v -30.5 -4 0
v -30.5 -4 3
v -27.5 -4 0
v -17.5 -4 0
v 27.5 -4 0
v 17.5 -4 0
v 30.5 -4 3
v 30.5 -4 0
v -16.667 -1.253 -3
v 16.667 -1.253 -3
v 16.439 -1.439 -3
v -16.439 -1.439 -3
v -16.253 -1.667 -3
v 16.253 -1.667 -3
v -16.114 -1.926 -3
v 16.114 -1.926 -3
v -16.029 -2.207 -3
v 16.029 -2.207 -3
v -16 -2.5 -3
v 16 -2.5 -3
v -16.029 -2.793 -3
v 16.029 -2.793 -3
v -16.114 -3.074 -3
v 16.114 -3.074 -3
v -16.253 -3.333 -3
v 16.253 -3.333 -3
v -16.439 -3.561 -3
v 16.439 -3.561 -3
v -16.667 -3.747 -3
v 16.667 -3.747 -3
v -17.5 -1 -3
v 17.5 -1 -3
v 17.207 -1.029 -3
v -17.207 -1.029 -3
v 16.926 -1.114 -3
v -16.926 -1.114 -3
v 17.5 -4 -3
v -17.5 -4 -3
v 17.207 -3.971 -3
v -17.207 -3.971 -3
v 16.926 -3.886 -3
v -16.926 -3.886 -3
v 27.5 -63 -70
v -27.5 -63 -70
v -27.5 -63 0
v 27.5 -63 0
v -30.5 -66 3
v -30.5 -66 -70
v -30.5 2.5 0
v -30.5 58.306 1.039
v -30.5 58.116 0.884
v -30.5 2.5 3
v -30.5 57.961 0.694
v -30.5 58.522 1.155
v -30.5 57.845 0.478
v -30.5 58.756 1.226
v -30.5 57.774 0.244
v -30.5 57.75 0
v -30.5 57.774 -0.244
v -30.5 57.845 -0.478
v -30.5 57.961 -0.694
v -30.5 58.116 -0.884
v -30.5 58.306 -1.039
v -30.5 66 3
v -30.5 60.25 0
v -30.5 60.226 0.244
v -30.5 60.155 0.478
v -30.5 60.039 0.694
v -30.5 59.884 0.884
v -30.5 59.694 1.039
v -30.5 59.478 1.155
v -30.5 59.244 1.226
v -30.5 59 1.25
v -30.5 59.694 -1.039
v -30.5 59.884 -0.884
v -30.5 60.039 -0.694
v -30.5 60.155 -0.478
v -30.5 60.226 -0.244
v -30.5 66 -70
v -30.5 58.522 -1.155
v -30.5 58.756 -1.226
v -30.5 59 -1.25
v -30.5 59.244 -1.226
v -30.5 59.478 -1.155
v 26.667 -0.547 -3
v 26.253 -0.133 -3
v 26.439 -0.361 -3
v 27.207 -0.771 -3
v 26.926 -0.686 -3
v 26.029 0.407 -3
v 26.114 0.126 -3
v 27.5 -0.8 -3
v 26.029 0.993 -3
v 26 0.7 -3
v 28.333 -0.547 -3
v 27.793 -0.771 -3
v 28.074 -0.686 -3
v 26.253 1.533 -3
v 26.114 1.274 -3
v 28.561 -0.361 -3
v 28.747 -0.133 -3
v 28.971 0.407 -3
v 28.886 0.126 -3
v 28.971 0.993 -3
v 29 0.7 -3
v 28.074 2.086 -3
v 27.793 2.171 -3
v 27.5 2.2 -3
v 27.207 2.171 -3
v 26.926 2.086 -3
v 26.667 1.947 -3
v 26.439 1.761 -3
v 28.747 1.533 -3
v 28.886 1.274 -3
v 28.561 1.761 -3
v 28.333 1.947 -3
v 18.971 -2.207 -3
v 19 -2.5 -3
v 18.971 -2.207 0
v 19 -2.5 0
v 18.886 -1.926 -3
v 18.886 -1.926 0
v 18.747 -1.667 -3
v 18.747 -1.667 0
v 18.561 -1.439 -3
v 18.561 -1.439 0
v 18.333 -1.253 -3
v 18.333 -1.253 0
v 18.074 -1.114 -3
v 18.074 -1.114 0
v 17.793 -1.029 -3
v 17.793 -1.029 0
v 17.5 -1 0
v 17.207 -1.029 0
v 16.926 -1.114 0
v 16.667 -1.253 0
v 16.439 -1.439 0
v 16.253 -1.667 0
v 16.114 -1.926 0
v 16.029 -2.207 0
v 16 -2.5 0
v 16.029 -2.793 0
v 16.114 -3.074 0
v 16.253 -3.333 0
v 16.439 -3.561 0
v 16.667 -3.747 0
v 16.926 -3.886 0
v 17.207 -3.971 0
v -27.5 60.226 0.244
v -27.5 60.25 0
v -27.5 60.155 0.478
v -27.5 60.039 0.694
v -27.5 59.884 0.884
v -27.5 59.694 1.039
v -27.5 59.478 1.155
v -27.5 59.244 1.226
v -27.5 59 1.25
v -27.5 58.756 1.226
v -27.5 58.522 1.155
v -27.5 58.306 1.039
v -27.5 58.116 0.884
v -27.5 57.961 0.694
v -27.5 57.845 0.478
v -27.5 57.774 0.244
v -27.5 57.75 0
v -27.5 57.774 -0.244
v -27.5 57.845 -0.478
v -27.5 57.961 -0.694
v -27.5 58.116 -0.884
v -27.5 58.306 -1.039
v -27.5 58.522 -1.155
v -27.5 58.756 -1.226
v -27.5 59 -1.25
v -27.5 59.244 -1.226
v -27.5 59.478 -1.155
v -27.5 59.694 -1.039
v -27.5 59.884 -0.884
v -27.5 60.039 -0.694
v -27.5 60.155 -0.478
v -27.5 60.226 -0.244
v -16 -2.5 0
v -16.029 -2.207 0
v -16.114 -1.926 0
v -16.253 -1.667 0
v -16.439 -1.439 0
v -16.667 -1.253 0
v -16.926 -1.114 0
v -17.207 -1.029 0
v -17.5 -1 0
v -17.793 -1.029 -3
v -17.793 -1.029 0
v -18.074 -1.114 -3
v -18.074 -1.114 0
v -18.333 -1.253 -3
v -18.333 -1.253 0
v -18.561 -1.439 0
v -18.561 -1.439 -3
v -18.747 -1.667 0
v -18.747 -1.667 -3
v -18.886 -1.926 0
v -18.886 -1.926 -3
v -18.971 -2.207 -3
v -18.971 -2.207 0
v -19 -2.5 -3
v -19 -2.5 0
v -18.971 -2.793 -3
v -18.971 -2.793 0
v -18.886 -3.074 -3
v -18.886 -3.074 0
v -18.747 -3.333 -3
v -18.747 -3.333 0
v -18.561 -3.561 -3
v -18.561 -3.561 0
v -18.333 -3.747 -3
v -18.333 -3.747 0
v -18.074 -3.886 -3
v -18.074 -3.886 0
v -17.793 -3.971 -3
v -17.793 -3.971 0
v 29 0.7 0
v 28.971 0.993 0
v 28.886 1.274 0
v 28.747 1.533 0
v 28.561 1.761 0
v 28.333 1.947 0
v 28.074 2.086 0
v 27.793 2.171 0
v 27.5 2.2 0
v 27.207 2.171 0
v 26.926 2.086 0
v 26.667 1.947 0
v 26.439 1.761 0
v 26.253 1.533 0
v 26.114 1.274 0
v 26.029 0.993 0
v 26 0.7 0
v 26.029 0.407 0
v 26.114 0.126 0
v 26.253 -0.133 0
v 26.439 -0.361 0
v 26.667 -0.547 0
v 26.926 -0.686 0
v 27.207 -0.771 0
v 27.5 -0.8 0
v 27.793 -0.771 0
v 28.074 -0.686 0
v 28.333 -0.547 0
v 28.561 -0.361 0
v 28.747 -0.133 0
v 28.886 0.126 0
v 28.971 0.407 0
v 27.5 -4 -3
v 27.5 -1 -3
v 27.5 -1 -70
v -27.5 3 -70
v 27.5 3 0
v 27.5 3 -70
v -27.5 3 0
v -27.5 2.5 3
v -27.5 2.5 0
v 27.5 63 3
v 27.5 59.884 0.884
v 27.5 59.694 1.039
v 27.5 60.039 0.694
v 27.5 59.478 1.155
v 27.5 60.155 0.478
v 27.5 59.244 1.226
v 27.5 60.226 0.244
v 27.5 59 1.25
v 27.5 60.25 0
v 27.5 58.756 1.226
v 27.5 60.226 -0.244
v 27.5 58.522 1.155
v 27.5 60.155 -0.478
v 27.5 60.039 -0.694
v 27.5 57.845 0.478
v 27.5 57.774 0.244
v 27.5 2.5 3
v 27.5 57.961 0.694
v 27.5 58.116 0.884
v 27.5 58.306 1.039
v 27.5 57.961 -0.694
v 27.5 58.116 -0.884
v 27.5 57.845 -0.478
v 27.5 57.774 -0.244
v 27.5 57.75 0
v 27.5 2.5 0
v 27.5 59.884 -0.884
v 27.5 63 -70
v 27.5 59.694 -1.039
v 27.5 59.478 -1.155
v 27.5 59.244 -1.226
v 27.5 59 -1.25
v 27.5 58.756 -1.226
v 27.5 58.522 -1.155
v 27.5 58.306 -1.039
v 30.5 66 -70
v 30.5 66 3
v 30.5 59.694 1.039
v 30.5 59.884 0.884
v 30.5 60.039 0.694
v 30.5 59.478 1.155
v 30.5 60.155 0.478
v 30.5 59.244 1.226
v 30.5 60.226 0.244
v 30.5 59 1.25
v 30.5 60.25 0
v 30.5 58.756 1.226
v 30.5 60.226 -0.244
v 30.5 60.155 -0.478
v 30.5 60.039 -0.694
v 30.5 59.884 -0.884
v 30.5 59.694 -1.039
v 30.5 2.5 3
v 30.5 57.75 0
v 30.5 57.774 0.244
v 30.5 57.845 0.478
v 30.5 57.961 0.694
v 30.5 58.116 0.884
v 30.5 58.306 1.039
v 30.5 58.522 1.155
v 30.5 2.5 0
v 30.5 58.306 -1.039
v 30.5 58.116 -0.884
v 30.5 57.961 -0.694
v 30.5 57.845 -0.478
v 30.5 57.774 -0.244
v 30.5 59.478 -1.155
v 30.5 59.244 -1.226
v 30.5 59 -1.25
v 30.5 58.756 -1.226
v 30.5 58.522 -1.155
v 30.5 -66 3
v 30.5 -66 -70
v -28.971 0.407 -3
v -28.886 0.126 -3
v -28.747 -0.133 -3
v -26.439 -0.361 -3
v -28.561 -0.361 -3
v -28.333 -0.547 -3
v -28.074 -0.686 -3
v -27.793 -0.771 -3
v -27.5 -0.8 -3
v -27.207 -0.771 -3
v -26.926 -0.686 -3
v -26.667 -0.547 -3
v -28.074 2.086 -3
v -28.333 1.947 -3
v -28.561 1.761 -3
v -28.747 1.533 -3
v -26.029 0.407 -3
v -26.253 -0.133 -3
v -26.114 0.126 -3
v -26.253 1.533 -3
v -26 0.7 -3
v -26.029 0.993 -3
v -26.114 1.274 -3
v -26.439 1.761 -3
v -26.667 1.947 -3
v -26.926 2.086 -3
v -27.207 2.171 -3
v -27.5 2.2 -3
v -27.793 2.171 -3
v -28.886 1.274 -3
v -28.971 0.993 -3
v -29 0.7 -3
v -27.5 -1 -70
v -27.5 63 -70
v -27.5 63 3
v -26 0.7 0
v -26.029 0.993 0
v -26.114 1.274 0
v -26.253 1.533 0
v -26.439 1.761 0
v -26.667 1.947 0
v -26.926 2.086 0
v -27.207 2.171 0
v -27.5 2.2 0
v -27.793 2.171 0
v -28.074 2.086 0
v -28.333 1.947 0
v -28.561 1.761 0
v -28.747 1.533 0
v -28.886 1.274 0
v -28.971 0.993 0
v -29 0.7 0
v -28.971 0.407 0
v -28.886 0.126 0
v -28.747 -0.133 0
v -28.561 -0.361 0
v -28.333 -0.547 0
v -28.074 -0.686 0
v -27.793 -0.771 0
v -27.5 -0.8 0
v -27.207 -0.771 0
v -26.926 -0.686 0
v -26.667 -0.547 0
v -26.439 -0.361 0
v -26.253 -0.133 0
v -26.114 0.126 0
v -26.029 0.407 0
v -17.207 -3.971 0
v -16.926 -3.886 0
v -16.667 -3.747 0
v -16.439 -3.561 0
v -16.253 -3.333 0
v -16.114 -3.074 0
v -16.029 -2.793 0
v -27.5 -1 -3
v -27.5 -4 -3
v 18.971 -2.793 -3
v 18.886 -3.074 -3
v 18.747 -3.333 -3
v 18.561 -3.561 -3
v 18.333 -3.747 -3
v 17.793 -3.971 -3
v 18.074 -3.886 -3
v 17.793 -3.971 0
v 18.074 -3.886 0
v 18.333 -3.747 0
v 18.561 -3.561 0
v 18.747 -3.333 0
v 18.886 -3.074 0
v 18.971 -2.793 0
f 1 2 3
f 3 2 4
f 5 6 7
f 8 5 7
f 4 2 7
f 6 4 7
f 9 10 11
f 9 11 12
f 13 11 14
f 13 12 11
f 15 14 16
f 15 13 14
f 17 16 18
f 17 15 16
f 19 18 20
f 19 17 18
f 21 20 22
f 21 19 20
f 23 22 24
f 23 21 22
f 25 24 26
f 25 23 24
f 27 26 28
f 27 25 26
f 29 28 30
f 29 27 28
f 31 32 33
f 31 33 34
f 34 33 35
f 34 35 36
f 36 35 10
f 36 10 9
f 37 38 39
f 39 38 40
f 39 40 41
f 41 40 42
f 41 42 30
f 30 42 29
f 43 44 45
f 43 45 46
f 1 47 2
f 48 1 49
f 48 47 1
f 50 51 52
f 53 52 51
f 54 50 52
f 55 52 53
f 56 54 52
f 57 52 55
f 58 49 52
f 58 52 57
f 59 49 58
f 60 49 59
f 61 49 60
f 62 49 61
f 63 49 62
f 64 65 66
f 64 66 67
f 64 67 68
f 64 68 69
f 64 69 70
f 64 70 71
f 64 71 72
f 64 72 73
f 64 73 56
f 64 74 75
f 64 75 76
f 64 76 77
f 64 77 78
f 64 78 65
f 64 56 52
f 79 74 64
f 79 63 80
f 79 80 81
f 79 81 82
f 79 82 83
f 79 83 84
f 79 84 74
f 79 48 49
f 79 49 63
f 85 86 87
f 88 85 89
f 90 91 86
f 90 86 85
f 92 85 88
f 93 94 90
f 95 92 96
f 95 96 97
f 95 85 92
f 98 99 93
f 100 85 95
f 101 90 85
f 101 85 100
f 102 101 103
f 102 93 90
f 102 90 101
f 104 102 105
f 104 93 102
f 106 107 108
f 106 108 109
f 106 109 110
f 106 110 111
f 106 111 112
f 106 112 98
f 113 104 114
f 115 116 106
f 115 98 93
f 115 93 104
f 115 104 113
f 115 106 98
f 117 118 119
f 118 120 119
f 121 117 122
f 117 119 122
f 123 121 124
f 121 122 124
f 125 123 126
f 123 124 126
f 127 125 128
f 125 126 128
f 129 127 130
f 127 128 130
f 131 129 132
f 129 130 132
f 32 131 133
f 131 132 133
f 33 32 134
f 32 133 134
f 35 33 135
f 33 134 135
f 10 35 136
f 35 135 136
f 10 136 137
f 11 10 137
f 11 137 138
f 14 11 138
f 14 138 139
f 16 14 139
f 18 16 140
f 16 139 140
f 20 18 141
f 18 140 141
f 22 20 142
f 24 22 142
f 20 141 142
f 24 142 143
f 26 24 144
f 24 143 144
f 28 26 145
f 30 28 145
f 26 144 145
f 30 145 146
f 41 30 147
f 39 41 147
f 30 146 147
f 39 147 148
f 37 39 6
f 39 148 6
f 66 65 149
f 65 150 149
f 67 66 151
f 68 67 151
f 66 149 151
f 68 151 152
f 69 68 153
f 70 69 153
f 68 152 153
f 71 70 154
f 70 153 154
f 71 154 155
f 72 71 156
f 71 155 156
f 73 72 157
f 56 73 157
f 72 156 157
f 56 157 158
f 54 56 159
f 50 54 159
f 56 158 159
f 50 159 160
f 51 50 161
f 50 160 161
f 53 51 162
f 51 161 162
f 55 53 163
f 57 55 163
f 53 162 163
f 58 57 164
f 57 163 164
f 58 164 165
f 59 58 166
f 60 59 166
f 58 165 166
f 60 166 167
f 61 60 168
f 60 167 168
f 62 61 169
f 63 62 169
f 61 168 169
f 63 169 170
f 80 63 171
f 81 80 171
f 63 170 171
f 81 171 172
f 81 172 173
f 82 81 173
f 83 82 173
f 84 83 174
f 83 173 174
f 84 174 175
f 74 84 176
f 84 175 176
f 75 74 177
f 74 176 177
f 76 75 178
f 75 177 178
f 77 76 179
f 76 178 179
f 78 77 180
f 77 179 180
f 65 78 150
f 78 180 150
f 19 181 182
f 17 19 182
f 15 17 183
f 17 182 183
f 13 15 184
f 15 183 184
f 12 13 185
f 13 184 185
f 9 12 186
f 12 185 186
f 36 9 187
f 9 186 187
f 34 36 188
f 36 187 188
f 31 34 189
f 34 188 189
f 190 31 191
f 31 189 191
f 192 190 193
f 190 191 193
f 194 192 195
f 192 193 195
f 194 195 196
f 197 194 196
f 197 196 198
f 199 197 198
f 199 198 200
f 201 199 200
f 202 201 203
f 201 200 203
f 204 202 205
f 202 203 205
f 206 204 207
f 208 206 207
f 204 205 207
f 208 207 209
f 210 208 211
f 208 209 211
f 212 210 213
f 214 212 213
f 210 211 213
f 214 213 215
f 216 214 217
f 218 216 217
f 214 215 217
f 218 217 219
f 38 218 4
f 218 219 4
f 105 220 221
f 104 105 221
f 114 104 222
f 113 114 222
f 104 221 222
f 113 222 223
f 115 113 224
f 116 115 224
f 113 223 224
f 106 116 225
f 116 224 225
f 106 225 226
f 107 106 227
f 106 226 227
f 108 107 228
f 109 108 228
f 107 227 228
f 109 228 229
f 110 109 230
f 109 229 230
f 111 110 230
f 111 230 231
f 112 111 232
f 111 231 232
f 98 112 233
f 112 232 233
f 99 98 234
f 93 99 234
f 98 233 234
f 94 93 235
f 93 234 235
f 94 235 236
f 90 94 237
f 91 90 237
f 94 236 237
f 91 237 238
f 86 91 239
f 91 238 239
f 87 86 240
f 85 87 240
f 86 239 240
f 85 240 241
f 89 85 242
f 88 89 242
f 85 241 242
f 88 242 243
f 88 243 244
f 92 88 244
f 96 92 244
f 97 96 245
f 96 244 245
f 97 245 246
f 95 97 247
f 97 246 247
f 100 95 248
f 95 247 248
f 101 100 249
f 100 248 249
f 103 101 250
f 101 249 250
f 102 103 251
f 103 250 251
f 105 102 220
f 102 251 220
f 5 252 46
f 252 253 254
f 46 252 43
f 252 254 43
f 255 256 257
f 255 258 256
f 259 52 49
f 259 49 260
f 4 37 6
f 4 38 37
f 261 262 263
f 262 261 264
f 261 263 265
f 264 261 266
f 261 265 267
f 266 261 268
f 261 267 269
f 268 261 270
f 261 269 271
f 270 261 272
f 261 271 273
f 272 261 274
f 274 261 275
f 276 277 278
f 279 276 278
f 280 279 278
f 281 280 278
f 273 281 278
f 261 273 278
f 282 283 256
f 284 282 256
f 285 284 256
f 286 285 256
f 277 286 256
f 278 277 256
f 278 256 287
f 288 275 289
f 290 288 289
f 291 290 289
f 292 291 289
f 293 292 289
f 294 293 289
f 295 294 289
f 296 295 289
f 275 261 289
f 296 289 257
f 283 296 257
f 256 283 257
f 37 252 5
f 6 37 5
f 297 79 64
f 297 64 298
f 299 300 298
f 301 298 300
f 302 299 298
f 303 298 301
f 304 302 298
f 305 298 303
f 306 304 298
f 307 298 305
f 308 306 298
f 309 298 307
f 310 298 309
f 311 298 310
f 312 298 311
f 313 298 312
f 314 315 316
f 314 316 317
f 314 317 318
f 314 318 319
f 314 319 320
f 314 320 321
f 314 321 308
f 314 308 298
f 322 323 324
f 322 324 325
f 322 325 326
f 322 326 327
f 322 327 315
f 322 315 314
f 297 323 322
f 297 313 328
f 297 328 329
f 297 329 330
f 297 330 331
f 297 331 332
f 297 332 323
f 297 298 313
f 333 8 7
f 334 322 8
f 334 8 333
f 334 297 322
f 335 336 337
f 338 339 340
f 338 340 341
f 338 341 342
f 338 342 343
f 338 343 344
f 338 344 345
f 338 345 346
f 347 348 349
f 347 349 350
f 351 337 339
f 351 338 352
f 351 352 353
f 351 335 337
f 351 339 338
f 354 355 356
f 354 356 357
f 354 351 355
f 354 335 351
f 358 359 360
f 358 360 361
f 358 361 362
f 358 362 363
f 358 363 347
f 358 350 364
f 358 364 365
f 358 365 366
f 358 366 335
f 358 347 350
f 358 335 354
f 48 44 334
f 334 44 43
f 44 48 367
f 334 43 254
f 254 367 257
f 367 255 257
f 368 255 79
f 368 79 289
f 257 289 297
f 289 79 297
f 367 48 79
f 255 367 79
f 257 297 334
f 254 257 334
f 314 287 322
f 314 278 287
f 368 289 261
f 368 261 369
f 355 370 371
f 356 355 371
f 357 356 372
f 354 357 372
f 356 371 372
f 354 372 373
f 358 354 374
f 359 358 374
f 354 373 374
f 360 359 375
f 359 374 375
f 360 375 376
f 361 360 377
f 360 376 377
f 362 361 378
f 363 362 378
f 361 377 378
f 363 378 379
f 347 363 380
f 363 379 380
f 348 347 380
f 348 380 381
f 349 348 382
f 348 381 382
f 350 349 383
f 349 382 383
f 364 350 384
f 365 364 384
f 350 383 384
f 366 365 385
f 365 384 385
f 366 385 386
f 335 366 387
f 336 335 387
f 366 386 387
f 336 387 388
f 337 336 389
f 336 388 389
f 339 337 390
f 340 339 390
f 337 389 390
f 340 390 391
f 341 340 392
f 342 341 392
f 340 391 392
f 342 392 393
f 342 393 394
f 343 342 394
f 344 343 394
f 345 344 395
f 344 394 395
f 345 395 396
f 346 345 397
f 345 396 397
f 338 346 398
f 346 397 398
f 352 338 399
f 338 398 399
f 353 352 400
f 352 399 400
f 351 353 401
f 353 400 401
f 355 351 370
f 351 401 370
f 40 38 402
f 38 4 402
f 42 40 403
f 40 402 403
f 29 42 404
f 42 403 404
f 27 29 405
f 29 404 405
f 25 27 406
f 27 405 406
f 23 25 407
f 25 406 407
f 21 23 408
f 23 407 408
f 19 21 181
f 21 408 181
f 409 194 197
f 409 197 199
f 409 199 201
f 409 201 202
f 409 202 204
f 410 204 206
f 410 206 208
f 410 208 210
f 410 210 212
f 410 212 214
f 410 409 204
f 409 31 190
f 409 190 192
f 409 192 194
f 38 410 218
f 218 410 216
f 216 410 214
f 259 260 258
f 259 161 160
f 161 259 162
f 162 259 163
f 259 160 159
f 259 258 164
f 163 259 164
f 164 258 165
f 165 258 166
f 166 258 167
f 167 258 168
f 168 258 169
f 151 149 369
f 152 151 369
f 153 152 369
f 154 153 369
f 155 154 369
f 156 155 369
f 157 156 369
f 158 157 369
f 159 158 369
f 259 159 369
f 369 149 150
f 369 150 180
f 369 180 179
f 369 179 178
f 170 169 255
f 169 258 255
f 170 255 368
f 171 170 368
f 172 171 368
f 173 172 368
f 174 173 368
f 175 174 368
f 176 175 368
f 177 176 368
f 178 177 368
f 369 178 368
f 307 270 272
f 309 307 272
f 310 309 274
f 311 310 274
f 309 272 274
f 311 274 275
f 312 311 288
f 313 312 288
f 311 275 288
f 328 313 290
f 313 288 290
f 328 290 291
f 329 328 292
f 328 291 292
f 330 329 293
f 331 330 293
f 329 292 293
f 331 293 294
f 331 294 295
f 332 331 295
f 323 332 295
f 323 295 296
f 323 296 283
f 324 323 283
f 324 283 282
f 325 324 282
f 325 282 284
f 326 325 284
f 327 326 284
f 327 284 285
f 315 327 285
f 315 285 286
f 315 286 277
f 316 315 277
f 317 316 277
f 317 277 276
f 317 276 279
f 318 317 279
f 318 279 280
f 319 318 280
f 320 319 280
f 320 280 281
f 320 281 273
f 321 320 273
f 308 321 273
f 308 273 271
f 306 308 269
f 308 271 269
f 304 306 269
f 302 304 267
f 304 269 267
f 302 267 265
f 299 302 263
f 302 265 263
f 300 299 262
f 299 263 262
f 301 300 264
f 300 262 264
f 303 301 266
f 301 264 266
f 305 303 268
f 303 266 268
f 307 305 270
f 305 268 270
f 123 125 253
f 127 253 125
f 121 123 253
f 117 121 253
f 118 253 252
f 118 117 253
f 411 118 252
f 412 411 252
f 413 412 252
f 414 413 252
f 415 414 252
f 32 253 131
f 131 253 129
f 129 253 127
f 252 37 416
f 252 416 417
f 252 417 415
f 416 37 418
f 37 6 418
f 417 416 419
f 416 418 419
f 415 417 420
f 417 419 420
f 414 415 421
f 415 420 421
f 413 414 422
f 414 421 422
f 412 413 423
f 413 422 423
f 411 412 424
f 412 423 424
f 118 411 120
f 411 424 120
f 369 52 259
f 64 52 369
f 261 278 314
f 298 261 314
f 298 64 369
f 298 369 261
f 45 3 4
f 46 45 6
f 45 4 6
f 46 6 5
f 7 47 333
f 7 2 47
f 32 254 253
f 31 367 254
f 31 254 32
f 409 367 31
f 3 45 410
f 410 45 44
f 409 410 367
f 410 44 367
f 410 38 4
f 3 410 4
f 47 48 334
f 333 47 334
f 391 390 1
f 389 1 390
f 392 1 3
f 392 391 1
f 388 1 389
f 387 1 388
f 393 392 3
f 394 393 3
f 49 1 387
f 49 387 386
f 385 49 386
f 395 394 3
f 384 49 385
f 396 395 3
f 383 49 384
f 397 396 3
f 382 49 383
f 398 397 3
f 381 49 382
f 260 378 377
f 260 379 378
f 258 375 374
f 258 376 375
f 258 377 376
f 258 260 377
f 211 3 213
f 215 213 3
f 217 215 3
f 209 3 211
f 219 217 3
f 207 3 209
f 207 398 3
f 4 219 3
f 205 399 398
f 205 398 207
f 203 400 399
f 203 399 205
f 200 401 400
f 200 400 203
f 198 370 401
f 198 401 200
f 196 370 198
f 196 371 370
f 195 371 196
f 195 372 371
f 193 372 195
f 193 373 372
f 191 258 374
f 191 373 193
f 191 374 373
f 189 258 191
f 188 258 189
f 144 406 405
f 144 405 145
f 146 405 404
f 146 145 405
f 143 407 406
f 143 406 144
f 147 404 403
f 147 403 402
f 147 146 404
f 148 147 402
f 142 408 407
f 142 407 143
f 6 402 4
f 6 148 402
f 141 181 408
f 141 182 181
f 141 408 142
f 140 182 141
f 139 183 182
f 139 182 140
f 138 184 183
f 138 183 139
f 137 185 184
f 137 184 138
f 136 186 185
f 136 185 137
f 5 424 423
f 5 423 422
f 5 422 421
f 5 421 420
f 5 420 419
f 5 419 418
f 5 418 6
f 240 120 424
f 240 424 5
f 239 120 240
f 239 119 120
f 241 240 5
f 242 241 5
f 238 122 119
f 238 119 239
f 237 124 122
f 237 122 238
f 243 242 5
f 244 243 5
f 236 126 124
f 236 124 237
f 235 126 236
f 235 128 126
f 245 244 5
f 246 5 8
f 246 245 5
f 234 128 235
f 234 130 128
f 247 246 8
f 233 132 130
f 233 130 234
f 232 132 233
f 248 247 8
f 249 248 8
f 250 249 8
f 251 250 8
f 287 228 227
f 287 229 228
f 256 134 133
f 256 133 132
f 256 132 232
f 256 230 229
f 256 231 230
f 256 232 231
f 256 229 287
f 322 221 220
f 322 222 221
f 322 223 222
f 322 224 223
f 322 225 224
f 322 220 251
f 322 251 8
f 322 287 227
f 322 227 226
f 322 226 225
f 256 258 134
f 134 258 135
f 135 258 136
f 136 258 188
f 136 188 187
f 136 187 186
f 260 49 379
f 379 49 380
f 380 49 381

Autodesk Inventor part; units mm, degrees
ref_plane "YZ Plane" through (0, 0, 0) normal (1, 0, 0) x (0, 1, 0)
ref_plane "XZ Plane" through (0, 0, 0) normal (0, 1, 0) x (-1, 0, 0)
ref_plane "XY Plane" through (0, 0, 0) normal (0, 0, 1) x (1, 0, 0)
sketch "草圖1" plane through (0, 0, 0) normal (0, 0, 1) x (1, 0, 0)
  line L0 (-27.5, 3) -> (27.5, 3) construction
  line L1 (27.5, 3) -> (27.5, 63) construction
  line L2 (27.5, 63) -> (-27.5, 63) construction
  line L3 (-27.5, 63) -> (-27.5, 3) construction
  line L4 (-30.5, 66) -> (30.5, 66)
  line L5 (30.5, 66) -> (30.5, -5.5597)
  line L6 (-30.5, -3) -> (-30.5, 66)
  line L7 (-34.7579, 0) -> (34.7579, 0)
  line L8 (-30.5, -66) -> (30.5, -66)
  line L9 (30.5, -66) -> (30.5, -5.5597)
  line L10 (-30.5, -3) -> (-30.5, -66)
  line L11 (0, 77.5612) -> (0, -87.4517)
  point P0 (0, 3)
  point P1 (0, 3)
  point P2 (0, -3)
  point P3 (0, 0)
  dimension "d0" = 55
  dimension "d1" = 60
  dimension "d2" = 3
  dimension "d3" = 6
extrude "擠出1" add sketch "草圖1" along normal blind 3 and the other way blind 70
shell "薄殼1" thickness 3 removed faces 1 at (-10.1667, 22, -70)
sketch "草圖2" plane through (0, 0, 0) normal (0, 0, 1) x (1, 0, 0)
  line L0 (27.5, 63) -> (27.5, -4)
  line L1 (27.5, -4) -> (-27.5, -4)
  line L2 (-27.5, -4) -> (-27.5, 63)
  line L3 (0, 77.5612) -> (0, -87.4517) projected
  line L4 (-34.7579, 0) -> (34.7579, 0) projected
  line L5 (27.5, 63) -> (-27.5, 63) projected
  point P0 (0, 0)
  point P1 (-27.5, 0)
  point P2 (27.5, 0)
  dimension "d8" = 55
  dimension "d9" = 8
extrude "擠出2" cut sketch "草圖2" along normal blind 3 and the other way blind 2
sketch "草圖3" plane through (0, 0, 0) normal (1, 0, 0) x (0, 1, 0)
  circle A0 centre (59, 0) radius 1.25
  line L0 (-66, 3) -> (66, 3) projected
  line L1 (-4, 0) -> (-4, 3) construction
  line L2 (2, 0) -> (2, 3) construction
  dimension "d13" = 2.5
  dimension "d17" = 3
  dimension "d20" = 6
  dimension "d21" = 57
extrude "擠出3" cut sketch "草圖3" along normal through all both and the other way through all
sketch "草圖4" plane through (0, 0, 0) normal (1, 0, 0) x (0, 1, 0)
  line L0 (66, -70) -> (-66, -70) projected
  line L1 (1.4687, -70) -> (0, -70)
  line L2 (77.5612, 0) -> (-87.4517, 0) projected
  line L3 (3, 1) -> (3, -70)
  line L4 (3, -70) -> (-1, -70)
  line L5 (-1, -70) -> (-1, 1)
  line L6 (-4, 0) -> (-4, 3) projected
  line L7 (3, 1) -> (-1, 1)
  point P0 (0, 0)
  point P1 (3, 0)
  point P2 (3, 0)
  point P3 (3, 0)
  dimension "d39" = 71
  dimension "d40" = 4
extrude "擠出4" add sketch "草圖4" along normal mid plane 55
sketch "草圖5" plane through (0, 0, 3) normal (0, 0, 1) x (1, 0, 0)
  line L0 (-30.5, 66) -> (-30.5, -66) projected
  line L1 (-30.5, -4) -> (30.5, -4)
  line L2 (30.5, -4) -> (30.5, 2.5)
  line L3 (-30.5, 2.5) -> (-30.5, -4)
  line L4 (27.5, -4) -> (-27.5, -4) projected
  line L5 (30.5, -66) -> (30.5, 66) projected
  circle A0 centre (-27.5, 0.7) radius 1.25 construction
  line L6 (-27.5, 3) -> (27.5, 3) projected
  line L7 (-27.5, 3) -> (27.5, 3)
  line L8 (27.5, 3) -> (27.5, 2.5)
  line L9 (-27.5, 2.5) -> (-27.5, 3)
  line L10 (-30.5, 2.5) -> (-27.5, 2.5)
  line L11 (27.5, 2.5) -> (30.5, 2.5)
  line L12 (27.5, 63) -> (27.5, -4) construction
  point P0 (0, 0)
  dimension "d41" = 2.5
  dimension "d42" = 3
  dimension "d46" = 6.5
extrude "擠出5" cut sketch "草圖5" against normal blind 3
sketch "草圖6" plane through (-27.5, -63, 0) normal (1, 0, 0) x (0, 0, -1)
  line L0 (0, 63) -> (3, 63)
  line L1 (3, 63) -> (3, 59)
  line L2 (3, 59) -> (0, 59)
  line L3 (0, 59) -> (0, 63)
  line L4 (-3, 59) -> (0, 59) projected
  dimension "d37" = 3
extrude "擠出6" add sketch "草圖6" along normal up to surface (55 mm away)
sketch "草圖7" plane through (-30.5, -4, 0) normal (0, 0, 1) x (1, 0, 0)
  circle A0 centre (3, 4.7) radius 1.5
  circle A1 centre (13, 1.5) radius 1.5
  line L0 (61, 0) -> (0, 0) projected
  line L1 (30.5, 81.5612) -> (30.5, -83.4517) projected
  circle A2 centre (58, 4.7) radius 1.5
  circle A3 centre (48, 1.5) radius 1.5
  line L2 (0, 0) -> (0, 6.5) projected
  line L3 (0, 6.5) -> (3, 6.5) projected
  point P0 (30.5, 4)
  point P1 (0, 4)
  point P2 (58, 0)
  dimension "d30" = 3
  dimension "d31" = 3
  dimension "d32" = 35
  dimension "d38" = 3
  dimension "d45" = 1.8
extrude "擠出7" cut sketch "草圖7" against normal blind 3
equation "\"d8\" = d0"
properties part number "frame"
